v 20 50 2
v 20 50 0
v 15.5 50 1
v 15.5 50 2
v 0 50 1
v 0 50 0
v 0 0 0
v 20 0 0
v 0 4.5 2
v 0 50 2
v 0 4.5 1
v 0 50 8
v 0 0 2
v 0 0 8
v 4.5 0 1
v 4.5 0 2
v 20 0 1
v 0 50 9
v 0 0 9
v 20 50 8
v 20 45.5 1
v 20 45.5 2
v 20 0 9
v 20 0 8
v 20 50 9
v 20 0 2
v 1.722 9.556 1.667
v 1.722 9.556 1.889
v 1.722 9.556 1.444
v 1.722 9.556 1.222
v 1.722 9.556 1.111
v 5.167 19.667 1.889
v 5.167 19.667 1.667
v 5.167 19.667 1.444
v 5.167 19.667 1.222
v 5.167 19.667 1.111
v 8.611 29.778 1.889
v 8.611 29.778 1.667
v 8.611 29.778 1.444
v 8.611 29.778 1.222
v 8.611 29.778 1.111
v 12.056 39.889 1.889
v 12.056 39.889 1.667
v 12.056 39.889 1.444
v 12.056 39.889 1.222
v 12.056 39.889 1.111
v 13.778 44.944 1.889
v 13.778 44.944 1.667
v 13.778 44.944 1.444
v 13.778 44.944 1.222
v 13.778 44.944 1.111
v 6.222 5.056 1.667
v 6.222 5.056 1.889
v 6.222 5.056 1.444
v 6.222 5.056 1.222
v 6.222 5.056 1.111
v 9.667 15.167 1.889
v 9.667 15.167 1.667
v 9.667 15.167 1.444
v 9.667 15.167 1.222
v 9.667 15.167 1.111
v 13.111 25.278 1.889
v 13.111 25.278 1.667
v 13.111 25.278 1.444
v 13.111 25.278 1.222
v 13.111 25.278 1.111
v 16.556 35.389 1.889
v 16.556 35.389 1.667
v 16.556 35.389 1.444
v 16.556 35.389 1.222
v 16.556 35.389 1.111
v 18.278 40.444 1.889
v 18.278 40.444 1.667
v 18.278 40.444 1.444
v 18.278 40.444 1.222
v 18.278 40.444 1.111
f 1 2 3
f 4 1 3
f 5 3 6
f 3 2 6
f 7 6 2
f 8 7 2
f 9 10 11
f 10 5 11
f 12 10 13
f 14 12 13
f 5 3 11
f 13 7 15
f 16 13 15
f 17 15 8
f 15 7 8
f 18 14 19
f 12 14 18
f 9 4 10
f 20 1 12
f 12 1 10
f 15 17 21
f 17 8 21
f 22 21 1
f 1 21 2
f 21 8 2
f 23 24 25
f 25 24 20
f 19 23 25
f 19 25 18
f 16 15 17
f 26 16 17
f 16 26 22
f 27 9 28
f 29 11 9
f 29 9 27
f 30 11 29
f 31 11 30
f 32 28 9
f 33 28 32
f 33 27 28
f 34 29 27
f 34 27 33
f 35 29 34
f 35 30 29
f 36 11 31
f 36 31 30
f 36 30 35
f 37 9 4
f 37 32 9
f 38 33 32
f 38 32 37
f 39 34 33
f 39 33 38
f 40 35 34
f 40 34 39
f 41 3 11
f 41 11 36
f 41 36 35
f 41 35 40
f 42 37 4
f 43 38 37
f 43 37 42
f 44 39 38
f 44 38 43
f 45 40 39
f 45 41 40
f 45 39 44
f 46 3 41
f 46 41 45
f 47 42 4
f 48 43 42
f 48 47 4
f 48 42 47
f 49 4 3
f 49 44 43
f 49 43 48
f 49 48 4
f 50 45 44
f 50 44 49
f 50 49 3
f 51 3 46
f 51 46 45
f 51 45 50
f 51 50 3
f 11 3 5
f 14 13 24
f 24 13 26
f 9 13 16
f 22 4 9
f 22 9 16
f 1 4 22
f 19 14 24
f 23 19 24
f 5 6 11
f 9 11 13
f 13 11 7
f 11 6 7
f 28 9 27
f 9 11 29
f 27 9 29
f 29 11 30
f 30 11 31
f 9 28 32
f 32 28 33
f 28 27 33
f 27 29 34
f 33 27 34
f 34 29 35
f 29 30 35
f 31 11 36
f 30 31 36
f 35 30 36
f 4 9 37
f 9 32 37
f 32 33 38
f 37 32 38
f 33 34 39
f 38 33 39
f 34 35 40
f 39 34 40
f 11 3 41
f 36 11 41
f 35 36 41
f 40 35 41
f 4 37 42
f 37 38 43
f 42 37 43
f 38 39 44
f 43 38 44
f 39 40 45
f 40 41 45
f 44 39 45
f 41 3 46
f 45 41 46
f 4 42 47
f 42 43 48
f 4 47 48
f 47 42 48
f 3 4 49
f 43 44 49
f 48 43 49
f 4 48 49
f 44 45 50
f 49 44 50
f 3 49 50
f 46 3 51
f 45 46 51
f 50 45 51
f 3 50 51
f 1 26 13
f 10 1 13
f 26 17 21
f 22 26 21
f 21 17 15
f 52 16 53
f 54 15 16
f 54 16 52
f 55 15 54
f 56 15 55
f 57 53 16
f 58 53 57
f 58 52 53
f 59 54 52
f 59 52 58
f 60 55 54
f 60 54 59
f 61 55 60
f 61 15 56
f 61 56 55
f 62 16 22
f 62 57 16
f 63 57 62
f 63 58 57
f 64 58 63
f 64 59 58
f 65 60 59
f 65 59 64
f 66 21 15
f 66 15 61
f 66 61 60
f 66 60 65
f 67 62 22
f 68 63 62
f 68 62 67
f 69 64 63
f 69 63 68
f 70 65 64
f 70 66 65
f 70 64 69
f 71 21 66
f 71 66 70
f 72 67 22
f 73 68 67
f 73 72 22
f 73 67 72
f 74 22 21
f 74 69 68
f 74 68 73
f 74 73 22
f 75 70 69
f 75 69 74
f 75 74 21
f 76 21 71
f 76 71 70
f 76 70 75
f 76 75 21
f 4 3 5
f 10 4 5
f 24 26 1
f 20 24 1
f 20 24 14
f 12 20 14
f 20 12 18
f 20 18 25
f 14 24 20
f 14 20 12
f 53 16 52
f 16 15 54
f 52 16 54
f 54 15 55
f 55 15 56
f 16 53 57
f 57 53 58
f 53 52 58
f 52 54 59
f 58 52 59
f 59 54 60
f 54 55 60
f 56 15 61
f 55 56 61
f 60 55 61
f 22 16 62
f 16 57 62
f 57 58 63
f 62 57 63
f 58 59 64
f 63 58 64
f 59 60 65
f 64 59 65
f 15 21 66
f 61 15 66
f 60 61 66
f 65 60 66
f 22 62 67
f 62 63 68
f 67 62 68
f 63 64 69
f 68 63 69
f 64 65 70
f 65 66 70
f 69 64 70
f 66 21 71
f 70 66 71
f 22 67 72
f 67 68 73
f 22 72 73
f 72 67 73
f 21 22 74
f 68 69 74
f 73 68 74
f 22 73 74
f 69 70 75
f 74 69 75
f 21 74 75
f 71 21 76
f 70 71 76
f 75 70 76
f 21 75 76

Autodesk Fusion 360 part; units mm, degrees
sketch "Esquisse1" plane through (0, 0, 0) normal (0, 0, 1) x (1, 0, 0)
  line L0 (0, 0) -> (20, 0)
  line L1 (20, 0) -> (20, 50)
  line L2 (20, 50) -> (0, 50)
  line L3 (0, 50) -> (0, 0)
  dimension "d5" = 20
  dimension "d6" = 50
extrude "Extrusion1" add sketch "Esquisse1" along normal blind 1 makes body 1 in component "support"
sketch "Esquisse1 (2)" plane through (0, 0, 1) normal (0, 0, 1) x (-1, 0, 0) in component "plaque_bas_droite"
  line L0 (0, -50) -> (0, 0)
  line L1 (0, 0) -> (-20, 0)
  line L2 (-20, 0) -> (-20, -50)
  line L3 (-20, -50) -> (0, -50)
  spline S0 degree 5 poles (-4.5, 0) (-5.12, -1.82) (-6.36, -5.46) (-8.22, -10.92) (-10.7, -18.2) (-13.8, -27.3) (-16.28, -34.58) (-18.14, -40.04) (-19.38, -43.68) (-20, -45.5) knots 0 0 0 0 0 0 0.2 0.4 0.6 0.8 1 1 1 1 1 1
  dimension "d10" = 4.5
  dimension "d11" = 4.5
extrude "Extrusion1'" add sketch "Esquisse1 (2)" along normal blind 1 separate body contours L1 L2 S0 makes body 2 in component "plaque_bas_droite"
sketch "Esquisse1 (3)" plane through (0, 0, 1) normal (0, 0, 1) x (-1, 0, 0) in component "plaque_haut_gauche"
  line L0 (0, -50) -> (0, 0)
  line L1 (0, 0) -> (-20, 0)
  line L2 (-20, 0) -> (-20, -50)
  line L3 (-20, -50) -> (0, -50)
  spline S0 degree 5 poles (0, -4.5) (-0.62, -6.32) (-1.86, -9.96) (-3.72, -15.42) (-6.2, -22.7) (-9.3, -31.8) (-11.78, -39.08) (-13.64, -44.54) (-14.88, -48.18) (-15.5, -50) knots 0 0 0 0 0 0 0.2 0.4 0.6 0.8 1 1 1 1 1 1
  dimension "d15" = 4.5
  dimension "d16" = 4.5
extrude "Extrusion1''" add sketch "Esquisse1 (3)" along normal blind 1 separate body contours L0 L3 S0 makes body 3 in component "plaque_haut_gauche"
extrude "Extrusion2" add 1 faces at (6.6667, 33.3333, 1) along direction (0, 0, 1) blind 1 on bodies 1 bodies 1 in component "support"
copy_body "CopierCollerCorps1" bodies 3 2 makes body 4 makes body 5 in component "support"
combine "Combiner1" operation cut target body 1 tool bodies 4 5 in component "support"
extrude "Extrusion1'''" add 1 faces at (5.1667, 34.8333, 2) along direction (0, 0, 1) blind 6 separate body on bodies 3 makes body 6 in component "mousse"
extrude "Extrusion2'" add 1 faces at (14.8333, 15.1667, 2) along direction (0, 0, 1) blind 6 separate body on bodies 2 makes body 7 in component "mousse"
extrude "Extrusion3" add 1 faces at (11.8333, 33.3333, 2) along direction (0, 0, 1) blind 6 on bodies 1 bodies 6 7 in component "mousse"
extrude "Extrusion1''''" add 1 faces at (6.6667, 33.3333, 8) along direction (0, 0, 1) blind 1 separate body on bodies 6 makes body 8 in component "plateau"
component "support" placed x (1, 0, 0) y (0, 1, 0) z (0, 0, 1) at (0, 0, 0)
component "plaque_bas_droite" placed x (1, 0, 0) y (0, 1, 0) z (0, 0, 1) at (0, 0, 0)
component "plaque_haut_gauche" placed x (1, 0, 0) y (0, 1, 0) z (0, 0, 1) at (0, 0, 0)
component "mousse" placed x (1, 0, 0) y (0, 1, 0) z (0, 0, 1) at (0, 0, 0)
component "plateau" placed x (1, 0, 0) y (0, 1, 0) z (0, 0, 1) at (0, 0, 0)
equation "largeur = 20 mm"
equation "longeur = 50 mm"
equation "ecart_au_carré = 9 mm"
equation "ecart_coté = ( ecart_au_carré / 2 )"
equation "d5 = largeur"
equation "d6 = longeur"
equation "Hauteur_support = 1 mm"
equation "d8 = Hauteur_support"
equation "d10 = ecart_coté"
equation "d11 = ecart_coté"
equation "epaisseur = 1 mm"
equation "d15 = ecart_coté"
equation "d16 = ecart_coté"
equation "d17 = epaisseur"
equation "d19 = epaisseur"
equation "mousse = 6 mm"
equation "d22 = mousse"
equation "d24 = mousse"
equation "d26 = mousse"
equation "d28 = epaisseur"
